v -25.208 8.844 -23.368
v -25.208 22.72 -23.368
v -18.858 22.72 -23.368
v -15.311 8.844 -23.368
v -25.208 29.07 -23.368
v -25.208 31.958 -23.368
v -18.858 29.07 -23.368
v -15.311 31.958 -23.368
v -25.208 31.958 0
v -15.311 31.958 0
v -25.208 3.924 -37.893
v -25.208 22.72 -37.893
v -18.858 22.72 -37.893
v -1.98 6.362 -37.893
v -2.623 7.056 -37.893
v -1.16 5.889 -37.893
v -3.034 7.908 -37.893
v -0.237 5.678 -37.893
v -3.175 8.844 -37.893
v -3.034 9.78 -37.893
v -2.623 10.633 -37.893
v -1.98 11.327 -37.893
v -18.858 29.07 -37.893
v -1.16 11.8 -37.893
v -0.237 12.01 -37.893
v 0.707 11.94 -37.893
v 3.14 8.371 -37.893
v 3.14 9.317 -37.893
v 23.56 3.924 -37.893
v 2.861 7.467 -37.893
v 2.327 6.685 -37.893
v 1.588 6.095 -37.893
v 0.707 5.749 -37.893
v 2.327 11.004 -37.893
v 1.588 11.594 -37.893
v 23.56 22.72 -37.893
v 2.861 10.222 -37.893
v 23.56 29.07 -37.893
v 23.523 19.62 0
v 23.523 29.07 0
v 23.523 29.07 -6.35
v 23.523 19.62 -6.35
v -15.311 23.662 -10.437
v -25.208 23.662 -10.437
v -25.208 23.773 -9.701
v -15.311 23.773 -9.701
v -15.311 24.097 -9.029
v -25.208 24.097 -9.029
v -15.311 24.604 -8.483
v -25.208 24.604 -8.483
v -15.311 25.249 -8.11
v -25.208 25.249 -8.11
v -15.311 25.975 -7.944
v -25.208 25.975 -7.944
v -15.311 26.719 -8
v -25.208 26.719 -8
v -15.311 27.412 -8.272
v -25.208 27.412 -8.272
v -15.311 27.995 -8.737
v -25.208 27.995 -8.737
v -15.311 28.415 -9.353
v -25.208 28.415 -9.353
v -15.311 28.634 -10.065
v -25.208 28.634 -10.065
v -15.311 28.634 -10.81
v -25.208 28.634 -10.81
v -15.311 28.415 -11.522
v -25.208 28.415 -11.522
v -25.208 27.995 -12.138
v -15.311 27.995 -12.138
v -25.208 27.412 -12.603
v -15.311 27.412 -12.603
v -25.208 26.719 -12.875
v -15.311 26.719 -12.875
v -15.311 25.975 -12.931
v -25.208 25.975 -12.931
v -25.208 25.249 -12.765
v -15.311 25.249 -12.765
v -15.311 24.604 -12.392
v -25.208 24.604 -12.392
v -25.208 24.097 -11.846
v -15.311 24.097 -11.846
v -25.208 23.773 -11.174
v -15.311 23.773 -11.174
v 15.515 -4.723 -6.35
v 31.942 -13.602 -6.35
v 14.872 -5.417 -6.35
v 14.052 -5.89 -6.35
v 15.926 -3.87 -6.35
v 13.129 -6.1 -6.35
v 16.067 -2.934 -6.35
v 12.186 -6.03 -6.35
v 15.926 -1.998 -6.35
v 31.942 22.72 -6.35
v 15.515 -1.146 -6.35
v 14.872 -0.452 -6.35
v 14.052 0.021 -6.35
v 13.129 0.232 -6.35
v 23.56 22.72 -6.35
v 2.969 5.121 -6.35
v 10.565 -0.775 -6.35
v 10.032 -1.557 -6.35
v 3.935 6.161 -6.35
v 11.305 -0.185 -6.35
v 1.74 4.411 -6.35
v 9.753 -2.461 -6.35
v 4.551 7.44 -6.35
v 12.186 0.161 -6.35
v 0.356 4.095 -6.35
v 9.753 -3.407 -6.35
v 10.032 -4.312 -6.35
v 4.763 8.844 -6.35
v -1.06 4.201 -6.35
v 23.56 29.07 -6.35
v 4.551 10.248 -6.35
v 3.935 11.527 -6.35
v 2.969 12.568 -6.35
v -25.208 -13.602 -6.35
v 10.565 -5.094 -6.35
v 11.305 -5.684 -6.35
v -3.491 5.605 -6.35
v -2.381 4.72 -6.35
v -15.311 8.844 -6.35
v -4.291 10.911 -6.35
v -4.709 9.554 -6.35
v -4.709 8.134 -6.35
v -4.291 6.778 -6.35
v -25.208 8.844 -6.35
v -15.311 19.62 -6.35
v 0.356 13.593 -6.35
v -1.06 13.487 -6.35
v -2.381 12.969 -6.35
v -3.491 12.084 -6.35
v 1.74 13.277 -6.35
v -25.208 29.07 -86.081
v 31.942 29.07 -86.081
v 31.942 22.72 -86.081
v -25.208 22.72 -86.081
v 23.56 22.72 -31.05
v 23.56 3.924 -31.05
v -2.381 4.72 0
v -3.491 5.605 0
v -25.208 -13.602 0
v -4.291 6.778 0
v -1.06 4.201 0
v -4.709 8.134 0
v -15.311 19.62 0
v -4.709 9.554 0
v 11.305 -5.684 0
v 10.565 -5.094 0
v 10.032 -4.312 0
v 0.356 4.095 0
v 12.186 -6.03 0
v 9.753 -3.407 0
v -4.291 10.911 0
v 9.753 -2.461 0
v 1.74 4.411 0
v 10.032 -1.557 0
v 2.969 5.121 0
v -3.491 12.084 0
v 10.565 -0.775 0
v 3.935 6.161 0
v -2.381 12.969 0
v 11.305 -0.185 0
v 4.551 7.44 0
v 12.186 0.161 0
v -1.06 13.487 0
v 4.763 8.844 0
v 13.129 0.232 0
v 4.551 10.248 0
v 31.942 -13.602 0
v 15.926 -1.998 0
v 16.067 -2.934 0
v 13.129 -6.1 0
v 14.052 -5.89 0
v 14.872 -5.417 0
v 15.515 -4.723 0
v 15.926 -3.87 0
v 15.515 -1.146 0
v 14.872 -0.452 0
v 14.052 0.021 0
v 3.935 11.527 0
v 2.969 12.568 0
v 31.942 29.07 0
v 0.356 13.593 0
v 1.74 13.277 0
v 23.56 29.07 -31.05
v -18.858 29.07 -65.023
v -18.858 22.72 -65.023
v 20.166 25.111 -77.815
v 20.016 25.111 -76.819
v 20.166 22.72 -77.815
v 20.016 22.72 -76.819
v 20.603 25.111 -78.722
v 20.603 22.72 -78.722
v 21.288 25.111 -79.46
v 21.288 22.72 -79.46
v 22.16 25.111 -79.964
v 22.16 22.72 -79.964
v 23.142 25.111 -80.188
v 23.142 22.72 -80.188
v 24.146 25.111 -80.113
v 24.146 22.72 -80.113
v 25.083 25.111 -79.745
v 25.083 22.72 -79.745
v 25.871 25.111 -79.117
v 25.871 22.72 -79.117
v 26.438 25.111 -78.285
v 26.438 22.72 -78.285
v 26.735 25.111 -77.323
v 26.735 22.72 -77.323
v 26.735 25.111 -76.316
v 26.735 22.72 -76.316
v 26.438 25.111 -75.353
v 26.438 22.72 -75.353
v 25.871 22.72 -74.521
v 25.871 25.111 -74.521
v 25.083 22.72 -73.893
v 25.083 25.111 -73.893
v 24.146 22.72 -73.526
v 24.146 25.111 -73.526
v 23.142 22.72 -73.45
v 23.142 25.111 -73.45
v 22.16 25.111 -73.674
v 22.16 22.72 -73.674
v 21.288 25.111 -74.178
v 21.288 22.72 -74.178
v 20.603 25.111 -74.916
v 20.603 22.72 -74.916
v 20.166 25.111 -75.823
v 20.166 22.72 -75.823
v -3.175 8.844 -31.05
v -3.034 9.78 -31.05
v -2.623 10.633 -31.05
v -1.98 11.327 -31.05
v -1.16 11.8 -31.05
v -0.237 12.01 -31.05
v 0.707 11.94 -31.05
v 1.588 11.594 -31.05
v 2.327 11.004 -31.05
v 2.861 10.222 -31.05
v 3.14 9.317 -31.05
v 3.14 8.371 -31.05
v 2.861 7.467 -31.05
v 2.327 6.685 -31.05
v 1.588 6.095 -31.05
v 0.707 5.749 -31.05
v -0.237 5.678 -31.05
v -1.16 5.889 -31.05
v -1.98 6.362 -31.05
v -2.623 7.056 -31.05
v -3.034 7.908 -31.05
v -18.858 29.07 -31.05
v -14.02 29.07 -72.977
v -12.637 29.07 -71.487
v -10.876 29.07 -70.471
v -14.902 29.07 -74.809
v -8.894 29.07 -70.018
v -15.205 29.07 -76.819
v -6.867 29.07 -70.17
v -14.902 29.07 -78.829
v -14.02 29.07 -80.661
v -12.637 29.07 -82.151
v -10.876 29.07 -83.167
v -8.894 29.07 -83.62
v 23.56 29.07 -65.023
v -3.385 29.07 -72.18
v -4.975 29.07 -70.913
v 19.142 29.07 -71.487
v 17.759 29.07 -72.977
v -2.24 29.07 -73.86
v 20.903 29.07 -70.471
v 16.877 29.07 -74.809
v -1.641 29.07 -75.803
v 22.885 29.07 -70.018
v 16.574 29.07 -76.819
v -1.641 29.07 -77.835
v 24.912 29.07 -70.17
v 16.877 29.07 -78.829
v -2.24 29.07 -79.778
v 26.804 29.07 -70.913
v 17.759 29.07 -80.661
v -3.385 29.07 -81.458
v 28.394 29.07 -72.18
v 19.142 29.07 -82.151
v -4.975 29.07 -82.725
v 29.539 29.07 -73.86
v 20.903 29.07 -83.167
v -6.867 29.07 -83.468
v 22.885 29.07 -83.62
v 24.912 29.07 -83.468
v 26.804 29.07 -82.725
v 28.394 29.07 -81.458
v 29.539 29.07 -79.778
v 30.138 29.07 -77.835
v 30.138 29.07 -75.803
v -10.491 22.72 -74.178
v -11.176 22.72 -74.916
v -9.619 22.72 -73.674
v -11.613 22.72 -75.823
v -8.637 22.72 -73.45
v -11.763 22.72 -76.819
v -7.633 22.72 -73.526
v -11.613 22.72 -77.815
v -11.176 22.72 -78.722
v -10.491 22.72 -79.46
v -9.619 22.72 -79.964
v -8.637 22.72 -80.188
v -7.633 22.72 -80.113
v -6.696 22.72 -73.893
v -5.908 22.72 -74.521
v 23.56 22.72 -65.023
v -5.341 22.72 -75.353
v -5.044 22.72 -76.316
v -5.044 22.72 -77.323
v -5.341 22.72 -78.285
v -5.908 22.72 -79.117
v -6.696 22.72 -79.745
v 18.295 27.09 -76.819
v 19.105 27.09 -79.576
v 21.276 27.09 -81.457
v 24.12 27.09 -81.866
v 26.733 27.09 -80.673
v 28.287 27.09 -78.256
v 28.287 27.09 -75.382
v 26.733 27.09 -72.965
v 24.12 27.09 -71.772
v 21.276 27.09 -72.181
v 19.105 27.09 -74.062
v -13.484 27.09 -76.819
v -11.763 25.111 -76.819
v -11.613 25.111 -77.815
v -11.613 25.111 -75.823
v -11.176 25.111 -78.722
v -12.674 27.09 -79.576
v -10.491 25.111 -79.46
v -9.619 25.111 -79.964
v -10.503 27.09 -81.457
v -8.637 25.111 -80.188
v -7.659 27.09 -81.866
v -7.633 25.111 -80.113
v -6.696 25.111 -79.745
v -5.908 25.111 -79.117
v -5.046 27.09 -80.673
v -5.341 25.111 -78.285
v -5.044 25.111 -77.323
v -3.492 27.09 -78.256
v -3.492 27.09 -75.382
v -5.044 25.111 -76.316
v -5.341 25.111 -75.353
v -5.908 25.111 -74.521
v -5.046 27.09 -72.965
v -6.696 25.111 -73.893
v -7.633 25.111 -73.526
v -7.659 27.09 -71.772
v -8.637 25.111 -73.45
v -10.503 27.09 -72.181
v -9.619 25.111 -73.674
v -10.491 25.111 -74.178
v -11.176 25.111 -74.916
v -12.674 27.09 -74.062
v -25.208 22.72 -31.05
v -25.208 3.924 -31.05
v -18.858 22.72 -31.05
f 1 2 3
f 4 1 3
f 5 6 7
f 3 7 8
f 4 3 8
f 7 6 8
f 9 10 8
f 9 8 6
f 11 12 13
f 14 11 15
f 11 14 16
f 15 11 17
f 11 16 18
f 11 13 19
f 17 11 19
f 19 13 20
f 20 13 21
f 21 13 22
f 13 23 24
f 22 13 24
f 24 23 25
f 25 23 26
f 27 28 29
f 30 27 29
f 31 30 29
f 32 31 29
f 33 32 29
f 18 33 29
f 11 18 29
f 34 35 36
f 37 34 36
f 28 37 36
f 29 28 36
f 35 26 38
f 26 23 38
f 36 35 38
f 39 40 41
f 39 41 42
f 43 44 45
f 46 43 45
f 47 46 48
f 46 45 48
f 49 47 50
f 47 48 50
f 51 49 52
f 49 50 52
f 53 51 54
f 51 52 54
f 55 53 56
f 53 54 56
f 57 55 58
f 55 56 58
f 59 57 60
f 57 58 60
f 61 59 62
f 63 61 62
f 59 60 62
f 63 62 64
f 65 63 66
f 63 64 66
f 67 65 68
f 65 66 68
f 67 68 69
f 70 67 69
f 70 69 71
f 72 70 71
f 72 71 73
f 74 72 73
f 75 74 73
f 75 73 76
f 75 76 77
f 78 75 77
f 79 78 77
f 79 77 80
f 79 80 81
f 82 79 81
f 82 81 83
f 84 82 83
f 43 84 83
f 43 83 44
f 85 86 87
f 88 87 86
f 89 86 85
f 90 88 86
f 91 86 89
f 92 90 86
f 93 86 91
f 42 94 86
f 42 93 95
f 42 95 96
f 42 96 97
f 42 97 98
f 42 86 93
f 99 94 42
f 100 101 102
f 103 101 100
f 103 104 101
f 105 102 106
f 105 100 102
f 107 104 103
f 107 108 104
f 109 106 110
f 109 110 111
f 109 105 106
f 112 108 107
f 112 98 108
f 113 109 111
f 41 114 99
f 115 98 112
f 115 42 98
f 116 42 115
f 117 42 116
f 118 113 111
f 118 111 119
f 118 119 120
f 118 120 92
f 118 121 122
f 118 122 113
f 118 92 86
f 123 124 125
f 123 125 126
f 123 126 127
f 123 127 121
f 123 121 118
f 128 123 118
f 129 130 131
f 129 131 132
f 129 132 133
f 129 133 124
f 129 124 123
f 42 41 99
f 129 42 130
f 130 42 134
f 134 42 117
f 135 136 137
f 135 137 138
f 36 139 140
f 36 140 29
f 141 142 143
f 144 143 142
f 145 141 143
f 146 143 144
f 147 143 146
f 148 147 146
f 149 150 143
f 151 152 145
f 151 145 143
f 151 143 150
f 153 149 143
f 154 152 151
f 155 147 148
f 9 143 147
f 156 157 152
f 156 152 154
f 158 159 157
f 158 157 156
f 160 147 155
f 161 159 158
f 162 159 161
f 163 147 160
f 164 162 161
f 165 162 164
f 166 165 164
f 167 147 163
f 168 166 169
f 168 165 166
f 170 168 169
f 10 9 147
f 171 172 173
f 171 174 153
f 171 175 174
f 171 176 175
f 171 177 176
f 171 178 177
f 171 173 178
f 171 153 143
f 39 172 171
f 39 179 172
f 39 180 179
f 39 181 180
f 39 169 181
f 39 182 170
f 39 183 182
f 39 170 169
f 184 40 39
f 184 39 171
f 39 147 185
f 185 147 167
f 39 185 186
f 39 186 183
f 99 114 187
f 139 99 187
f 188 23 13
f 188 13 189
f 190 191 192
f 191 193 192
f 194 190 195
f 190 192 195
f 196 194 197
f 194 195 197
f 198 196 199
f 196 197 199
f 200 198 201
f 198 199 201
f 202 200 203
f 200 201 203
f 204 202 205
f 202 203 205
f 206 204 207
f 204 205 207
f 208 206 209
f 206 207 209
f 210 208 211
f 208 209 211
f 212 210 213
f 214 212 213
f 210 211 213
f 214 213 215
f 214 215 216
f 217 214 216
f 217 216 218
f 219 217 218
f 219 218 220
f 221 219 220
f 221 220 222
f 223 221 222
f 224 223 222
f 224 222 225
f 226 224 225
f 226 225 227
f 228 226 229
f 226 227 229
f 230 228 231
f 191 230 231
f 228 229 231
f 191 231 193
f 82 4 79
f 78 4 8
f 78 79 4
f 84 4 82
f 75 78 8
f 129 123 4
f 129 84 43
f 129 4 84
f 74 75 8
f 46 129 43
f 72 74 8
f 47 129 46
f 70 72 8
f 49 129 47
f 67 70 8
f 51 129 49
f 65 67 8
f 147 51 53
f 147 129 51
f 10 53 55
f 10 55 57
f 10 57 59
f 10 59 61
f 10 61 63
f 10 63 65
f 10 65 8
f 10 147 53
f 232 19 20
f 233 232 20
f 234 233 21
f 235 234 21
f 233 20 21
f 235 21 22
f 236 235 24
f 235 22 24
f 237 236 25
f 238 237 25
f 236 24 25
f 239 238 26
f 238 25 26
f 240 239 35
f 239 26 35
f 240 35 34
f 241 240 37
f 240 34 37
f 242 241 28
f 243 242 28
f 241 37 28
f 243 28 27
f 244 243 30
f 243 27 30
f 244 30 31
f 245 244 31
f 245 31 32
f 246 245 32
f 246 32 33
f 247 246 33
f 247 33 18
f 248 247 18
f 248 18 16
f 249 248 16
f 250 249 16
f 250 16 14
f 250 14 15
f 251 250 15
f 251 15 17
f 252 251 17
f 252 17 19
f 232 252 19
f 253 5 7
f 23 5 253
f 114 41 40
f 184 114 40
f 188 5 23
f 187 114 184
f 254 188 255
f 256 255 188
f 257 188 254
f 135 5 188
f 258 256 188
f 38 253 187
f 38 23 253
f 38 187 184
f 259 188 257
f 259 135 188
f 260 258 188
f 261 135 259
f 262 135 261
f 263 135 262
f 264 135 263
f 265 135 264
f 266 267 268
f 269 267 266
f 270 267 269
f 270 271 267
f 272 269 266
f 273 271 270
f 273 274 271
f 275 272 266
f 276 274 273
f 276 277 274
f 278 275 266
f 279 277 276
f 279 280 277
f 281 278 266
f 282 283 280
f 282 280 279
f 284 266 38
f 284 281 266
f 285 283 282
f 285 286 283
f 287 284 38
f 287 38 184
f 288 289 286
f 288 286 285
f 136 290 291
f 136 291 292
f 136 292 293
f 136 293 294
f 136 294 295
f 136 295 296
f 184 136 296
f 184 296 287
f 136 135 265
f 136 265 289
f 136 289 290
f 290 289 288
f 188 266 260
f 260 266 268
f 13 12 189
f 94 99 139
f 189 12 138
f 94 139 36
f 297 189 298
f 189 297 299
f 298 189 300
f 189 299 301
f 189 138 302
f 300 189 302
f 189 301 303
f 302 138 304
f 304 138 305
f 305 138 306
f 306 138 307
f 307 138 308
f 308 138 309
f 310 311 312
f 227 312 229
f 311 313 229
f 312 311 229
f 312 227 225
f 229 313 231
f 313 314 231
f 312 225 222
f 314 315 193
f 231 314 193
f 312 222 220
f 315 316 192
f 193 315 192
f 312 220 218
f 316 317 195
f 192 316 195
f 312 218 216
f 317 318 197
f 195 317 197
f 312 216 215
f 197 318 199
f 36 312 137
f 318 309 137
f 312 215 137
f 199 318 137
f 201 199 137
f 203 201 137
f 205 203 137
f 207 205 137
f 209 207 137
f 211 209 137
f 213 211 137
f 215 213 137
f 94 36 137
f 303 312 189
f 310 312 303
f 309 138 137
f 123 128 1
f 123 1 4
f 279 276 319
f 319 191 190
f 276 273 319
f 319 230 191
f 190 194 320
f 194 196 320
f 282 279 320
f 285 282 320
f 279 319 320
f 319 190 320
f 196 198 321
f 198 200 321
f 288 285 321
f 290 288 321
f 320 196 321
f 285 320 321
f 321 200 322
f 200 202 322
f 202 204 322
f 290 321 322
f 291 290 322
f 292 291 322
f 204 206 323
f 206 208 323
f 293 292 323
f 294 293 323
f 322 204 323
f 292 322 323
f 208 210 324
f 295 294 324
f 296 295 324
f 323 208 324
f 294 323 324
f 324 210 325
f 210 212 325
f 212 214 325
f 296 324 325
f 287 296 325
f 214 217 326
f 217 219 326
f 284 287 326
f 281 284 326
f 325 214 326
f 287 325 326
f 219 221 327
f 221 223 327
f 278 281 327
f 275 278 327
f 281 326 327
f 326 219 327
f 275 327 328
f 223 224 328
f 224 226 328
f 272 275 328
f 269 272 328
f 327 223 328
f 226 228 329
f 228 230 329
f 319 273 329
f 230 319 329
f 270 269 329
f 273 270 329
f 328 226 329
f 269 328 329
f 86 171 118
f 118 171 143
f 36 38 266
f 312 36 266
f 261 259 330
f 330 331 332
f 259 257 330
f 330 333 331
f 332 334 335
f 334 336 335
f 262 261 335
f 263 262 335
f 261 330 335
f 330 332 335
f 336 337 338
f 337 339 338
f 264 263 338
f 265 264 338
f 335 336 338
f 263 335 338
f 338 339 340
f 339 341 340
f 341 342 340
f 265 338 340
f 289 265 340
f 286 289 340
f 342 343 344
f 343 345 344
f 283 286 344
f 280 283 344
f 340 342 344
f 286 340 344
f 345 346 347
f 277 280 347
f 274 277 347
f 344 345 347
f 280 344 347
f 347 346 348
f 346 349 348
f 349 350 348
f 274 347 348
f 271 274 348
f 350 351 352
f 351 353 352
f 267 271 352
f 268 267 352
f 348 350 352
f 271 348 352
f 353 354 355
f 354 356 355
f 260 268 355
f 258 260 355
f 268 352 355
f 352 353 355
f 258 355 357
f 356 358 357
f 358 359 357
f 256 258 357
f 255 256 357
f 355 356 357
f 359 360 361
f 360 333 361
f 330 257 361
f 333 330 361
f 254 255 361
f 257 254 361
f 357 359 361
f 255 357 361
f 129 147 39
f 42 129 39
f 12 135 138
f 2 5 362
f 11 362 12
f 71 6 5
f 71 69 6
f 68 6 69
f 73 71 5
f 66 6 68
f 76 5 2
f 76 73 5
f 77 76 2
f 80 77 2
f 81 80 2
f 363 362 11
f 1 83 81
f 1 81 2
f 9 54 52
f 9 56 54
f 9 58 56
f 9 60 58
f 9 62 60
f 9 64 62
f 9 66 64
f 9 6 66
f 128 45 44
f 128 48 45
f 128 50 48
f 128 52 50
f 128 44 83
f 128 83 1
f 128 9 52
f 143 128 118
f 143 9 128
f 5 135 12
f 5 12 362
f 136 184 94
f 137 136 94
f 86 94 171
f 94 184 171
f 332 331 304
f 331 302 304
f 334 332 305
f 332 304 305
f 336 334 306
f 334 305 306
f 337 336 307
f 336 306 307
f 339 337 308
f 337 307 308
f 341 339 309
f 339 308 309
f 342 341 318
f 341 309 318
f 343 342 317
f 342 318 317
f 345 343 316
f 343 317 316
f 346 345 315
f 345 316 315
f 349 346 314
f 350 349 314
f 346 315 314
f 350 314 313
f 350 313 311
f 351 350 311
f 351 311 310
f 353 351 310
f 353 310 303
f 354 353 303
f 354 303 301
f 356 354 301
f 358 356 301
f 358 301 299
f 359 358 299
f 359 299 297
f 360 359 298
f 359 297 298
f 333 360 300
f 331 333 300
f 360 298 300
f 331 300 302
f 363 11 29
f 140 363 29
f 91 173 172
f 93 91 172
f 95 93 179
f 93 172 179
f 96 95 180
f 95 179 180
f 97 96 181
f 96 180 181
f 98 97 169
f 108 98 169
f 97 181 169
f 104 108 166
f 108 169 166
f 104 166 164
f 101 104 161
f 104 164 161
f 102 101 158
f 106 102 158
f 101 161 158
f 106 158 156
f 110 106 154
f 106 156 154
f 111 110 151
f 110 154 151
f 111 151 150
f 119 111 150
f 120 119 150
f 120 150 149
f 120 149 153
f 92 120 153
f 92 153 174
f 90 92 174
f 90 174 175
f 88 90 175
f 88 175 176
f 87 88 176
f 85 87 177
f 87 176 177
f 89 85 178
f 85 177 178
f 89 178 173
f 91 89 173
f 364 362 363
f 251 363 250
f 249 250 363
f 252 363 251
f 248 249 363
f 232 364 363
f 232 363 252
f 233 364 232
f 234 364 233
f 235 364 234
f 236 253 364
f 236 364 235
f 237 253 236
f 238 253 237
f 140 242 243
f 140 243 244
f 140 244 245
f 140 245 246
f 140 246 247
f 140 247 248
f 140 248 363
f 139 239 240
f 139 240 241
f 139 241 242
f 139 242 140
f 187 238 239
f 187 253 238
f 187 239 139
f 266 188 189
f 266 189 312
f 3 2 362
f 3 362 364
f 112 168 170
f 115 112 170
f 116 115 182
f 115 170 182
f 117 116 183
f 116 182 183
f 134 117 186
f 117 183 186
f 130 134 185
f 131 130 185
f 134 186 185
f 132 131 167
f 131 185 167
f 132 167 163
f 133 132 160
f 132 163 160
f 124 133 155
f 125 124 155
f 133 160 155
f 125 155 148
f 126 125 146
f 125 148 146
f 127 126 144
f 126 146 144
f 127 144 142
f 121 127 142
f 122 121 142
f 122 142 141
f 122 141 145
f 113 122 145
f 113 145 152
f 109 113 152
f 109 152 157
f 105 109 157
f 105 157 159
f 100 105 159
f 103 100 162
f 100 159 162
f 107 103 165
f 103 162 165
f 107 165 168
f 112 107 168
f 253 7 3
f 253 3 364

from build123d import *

# Parameters (mm, degrees)
SKETCH1_R                                        = 3.175
SKETCH1_R_2                                      = 4.762499999
BOSS_EXTRUDE1_DEPTH                              = 6.35
BOSS_EXTRUDE2_DEPTH                              = 23.368
SKETCH3_W                                        = 6.35
SKETCH3_H                                        = 78.34
SKETCH3_W_2                                      = 8.382
BOSS_EXTRUDE3_DEPTH                              = 6.35
CUT_EXTRUDE1_REACH                               = 104.101
SKETCH4_R                                        = 2.5
BOSS_EXTRUDE4_DEPTH                              = 6.35
CSK_FOR_1_4_FLAT_HEAD_MACHINE_SCREW1_D           = 6.7564
CSK_FOR_1_4_FLAT_HEAD_MACHINE_SCREW1_CSINK_D     = 13.6398
CSK_FOR_1_4_FLAT_HEAD_MACHINE_SCREW1_CSINK_ANGLE = 82
SKETCH8_W                                        = 48.768
SKETCH8_H                                        = 6.843039895
BOSS_EXTRUDE5_DEPTH                              = 25.146
CUT_EXTRUDE2_REACH                               = 68.059
SKETCH10_R                                       = 3.175


with BuildPart() as part:
    # Sketch1 → Boss-Extrude1 (new body)
    with BuildSketch(Plane.XY):
        Polygon((23.52260518, 29.069744957), (31.942128684, 29.069744957), (31.942128684, -13.602255043), (-25.207871316, -13.602255043), (-25.207871316, 8.844196721), (-25.207871316, 31.958196721), (-18.857871316, 31.958196721), (-15.310946905, 31.958196721), (-15.310946905, 22.656471706), (-15.310946905, 19.620299994), (23.52260518, 19.620299994), (23.52260518, 22.656471706), align=None)
        with Locations((12.892128684, -2.934255043)):
            Circle(SKETCH1_R, mode=Mode.SUBTRACT)
        with Locations((6.7e-08, 8.844196721)):
            Circle(SKETCH1_R_2, mode=Mode.SUBTRACT)
    extrude(amount=-BOSS_EXTRUDE1_DEPTH)

    # Sketch2 → Boss-Extrude2 (add)
    with BuildSketch(Plane.XY):
        Polygon((-15.310946905, 31.958196721), (-18.857871316, 31.958196721), (-25.207871316, 31.958196721), (-25.207871316, 8.844196721), (-18.857871316, 8.844196721), (-15.310946905, 8.844196721), (-15.310946905, 19.620299994), align=None)
    extrude(amount=-BOSS_EXTRUDE2_DEPTH)

    # Sketch3 → Boss-Extrude3 (add)
    with BuildSketch(Plane(origin=(0, 29.069744957, 0), x_dir=(1, 0, 0), z_dir=(0, 1, 0))):
        with Locations((-22.032871316, 39.17)):
            Rectangle(SKETCH3_W, SKETCH3_H)
        with Locations((27.751128684, 39.17)):
            Rectangle(SKETCH3_W_2, SKETCH3_H)
    extrude(amount=-BOSS_EXTRUDE3_DEPTH)

    # Sketch4 → Cut-Extrude1 (cut, up to next)
    with BuildSketch(Plane.ZY.offset(25.207871316), mode=Mode.PRIVATE) as cut_extrude1_sk1:
        with Locations(Location((-10.437499124, 26.162307082, 0), (0, 0, 270))):
            Circle(SKETCH4_R)
    cut_extrude1_tool1 = extrude(cut_extrude1_sk1.sketch, amount=-CUT_EXTRUDE1_REACH, mode=Mode.PRIVATE) & part.part
    add(cut_extrude1_tool1.solids().sort_by_distance((-25.207871, 26.162307, -10.437499))[0], mode=Mode.SUBTRACT)

    # Sketch5 → Boss-Extrude4 (add)
    with BuildSketch(Plane(origin=(0, 29.069744957, 0), x_dir=(1, 0, 0), z_dir=(0, 1, 0))):
        Polygon((-25.207871316, 78.34), (-25.207871316, 65.022649662), (31.942128684, 65.022649662), (31.942128684, 78.34), (31.942128684, 86.081334737), (-25.207871316, 86.081334737), align=None)
    extrude(amount=-BOSS_EXTRUDE4_DEPTH)

    # CSK for 1/4 Flat Head Machine Screw1 (through all)
    with Locations(Plane(origin=(0, 29.069744957, 0), x_dir=(1, 0, 0), z_dir=(0, 1, 0))):
        with Locations((-8.384740386, 76.819020678), (23.394249394, 76.819020678)):
            CounterSinkHole(CSK_FOR_1_4_FLAT_HEAD_MACHINE_SCREW1_D / 2, CSK_FOR_1_4_FLAT_HEAD_MACHINE_SCREW1_CSINK_D / 2, counter_sink_angle=CSK_FOR_1_4_FLAT_HEAD_MACHINE_SCREW1_CSINK_ANGLE)

    # Sketch8 → Boss-Extrude5 (add)
    with BuildSketch(Plane(origin=(0, 29.069744957, 0), x_dir=(1, 0, 0), z_dir=(0, 1, 0))):
        with Locations((-0.823871316, 34.471519947)):
            Rectangle(SKETCH8_W, SKETCH8_H)
    extrude(amount=-BOSS_EXTRUDE5_DEPTH)

    # Sketch10 → Cut-Extrude2 (cut, up to next)
    with BuildSketch(Plane(origin=(0, 0, -37.893039895), x_dir=(-1, 0, 0), z_dir=(0, 0, -1)), mode=Mode.PRIVATE) as cut_extrude2_sk1:
        with Locations((-6.7e-08, 8.844196721)):
            Circle(SKETCH10_R)
    cut_extrude2_tool1 = extrude(cut_extrude2_sk1.sketch, amount=-CUT_EXTRUDE2_REACH, mode=Mode.PRIVATE) & part.part
    add(cut_extrude2_tool1.solids().sort_by_distance((0, 8.844197, -37.89304))[0], mode=Mode.SUBTRACT)


solid = part.part
